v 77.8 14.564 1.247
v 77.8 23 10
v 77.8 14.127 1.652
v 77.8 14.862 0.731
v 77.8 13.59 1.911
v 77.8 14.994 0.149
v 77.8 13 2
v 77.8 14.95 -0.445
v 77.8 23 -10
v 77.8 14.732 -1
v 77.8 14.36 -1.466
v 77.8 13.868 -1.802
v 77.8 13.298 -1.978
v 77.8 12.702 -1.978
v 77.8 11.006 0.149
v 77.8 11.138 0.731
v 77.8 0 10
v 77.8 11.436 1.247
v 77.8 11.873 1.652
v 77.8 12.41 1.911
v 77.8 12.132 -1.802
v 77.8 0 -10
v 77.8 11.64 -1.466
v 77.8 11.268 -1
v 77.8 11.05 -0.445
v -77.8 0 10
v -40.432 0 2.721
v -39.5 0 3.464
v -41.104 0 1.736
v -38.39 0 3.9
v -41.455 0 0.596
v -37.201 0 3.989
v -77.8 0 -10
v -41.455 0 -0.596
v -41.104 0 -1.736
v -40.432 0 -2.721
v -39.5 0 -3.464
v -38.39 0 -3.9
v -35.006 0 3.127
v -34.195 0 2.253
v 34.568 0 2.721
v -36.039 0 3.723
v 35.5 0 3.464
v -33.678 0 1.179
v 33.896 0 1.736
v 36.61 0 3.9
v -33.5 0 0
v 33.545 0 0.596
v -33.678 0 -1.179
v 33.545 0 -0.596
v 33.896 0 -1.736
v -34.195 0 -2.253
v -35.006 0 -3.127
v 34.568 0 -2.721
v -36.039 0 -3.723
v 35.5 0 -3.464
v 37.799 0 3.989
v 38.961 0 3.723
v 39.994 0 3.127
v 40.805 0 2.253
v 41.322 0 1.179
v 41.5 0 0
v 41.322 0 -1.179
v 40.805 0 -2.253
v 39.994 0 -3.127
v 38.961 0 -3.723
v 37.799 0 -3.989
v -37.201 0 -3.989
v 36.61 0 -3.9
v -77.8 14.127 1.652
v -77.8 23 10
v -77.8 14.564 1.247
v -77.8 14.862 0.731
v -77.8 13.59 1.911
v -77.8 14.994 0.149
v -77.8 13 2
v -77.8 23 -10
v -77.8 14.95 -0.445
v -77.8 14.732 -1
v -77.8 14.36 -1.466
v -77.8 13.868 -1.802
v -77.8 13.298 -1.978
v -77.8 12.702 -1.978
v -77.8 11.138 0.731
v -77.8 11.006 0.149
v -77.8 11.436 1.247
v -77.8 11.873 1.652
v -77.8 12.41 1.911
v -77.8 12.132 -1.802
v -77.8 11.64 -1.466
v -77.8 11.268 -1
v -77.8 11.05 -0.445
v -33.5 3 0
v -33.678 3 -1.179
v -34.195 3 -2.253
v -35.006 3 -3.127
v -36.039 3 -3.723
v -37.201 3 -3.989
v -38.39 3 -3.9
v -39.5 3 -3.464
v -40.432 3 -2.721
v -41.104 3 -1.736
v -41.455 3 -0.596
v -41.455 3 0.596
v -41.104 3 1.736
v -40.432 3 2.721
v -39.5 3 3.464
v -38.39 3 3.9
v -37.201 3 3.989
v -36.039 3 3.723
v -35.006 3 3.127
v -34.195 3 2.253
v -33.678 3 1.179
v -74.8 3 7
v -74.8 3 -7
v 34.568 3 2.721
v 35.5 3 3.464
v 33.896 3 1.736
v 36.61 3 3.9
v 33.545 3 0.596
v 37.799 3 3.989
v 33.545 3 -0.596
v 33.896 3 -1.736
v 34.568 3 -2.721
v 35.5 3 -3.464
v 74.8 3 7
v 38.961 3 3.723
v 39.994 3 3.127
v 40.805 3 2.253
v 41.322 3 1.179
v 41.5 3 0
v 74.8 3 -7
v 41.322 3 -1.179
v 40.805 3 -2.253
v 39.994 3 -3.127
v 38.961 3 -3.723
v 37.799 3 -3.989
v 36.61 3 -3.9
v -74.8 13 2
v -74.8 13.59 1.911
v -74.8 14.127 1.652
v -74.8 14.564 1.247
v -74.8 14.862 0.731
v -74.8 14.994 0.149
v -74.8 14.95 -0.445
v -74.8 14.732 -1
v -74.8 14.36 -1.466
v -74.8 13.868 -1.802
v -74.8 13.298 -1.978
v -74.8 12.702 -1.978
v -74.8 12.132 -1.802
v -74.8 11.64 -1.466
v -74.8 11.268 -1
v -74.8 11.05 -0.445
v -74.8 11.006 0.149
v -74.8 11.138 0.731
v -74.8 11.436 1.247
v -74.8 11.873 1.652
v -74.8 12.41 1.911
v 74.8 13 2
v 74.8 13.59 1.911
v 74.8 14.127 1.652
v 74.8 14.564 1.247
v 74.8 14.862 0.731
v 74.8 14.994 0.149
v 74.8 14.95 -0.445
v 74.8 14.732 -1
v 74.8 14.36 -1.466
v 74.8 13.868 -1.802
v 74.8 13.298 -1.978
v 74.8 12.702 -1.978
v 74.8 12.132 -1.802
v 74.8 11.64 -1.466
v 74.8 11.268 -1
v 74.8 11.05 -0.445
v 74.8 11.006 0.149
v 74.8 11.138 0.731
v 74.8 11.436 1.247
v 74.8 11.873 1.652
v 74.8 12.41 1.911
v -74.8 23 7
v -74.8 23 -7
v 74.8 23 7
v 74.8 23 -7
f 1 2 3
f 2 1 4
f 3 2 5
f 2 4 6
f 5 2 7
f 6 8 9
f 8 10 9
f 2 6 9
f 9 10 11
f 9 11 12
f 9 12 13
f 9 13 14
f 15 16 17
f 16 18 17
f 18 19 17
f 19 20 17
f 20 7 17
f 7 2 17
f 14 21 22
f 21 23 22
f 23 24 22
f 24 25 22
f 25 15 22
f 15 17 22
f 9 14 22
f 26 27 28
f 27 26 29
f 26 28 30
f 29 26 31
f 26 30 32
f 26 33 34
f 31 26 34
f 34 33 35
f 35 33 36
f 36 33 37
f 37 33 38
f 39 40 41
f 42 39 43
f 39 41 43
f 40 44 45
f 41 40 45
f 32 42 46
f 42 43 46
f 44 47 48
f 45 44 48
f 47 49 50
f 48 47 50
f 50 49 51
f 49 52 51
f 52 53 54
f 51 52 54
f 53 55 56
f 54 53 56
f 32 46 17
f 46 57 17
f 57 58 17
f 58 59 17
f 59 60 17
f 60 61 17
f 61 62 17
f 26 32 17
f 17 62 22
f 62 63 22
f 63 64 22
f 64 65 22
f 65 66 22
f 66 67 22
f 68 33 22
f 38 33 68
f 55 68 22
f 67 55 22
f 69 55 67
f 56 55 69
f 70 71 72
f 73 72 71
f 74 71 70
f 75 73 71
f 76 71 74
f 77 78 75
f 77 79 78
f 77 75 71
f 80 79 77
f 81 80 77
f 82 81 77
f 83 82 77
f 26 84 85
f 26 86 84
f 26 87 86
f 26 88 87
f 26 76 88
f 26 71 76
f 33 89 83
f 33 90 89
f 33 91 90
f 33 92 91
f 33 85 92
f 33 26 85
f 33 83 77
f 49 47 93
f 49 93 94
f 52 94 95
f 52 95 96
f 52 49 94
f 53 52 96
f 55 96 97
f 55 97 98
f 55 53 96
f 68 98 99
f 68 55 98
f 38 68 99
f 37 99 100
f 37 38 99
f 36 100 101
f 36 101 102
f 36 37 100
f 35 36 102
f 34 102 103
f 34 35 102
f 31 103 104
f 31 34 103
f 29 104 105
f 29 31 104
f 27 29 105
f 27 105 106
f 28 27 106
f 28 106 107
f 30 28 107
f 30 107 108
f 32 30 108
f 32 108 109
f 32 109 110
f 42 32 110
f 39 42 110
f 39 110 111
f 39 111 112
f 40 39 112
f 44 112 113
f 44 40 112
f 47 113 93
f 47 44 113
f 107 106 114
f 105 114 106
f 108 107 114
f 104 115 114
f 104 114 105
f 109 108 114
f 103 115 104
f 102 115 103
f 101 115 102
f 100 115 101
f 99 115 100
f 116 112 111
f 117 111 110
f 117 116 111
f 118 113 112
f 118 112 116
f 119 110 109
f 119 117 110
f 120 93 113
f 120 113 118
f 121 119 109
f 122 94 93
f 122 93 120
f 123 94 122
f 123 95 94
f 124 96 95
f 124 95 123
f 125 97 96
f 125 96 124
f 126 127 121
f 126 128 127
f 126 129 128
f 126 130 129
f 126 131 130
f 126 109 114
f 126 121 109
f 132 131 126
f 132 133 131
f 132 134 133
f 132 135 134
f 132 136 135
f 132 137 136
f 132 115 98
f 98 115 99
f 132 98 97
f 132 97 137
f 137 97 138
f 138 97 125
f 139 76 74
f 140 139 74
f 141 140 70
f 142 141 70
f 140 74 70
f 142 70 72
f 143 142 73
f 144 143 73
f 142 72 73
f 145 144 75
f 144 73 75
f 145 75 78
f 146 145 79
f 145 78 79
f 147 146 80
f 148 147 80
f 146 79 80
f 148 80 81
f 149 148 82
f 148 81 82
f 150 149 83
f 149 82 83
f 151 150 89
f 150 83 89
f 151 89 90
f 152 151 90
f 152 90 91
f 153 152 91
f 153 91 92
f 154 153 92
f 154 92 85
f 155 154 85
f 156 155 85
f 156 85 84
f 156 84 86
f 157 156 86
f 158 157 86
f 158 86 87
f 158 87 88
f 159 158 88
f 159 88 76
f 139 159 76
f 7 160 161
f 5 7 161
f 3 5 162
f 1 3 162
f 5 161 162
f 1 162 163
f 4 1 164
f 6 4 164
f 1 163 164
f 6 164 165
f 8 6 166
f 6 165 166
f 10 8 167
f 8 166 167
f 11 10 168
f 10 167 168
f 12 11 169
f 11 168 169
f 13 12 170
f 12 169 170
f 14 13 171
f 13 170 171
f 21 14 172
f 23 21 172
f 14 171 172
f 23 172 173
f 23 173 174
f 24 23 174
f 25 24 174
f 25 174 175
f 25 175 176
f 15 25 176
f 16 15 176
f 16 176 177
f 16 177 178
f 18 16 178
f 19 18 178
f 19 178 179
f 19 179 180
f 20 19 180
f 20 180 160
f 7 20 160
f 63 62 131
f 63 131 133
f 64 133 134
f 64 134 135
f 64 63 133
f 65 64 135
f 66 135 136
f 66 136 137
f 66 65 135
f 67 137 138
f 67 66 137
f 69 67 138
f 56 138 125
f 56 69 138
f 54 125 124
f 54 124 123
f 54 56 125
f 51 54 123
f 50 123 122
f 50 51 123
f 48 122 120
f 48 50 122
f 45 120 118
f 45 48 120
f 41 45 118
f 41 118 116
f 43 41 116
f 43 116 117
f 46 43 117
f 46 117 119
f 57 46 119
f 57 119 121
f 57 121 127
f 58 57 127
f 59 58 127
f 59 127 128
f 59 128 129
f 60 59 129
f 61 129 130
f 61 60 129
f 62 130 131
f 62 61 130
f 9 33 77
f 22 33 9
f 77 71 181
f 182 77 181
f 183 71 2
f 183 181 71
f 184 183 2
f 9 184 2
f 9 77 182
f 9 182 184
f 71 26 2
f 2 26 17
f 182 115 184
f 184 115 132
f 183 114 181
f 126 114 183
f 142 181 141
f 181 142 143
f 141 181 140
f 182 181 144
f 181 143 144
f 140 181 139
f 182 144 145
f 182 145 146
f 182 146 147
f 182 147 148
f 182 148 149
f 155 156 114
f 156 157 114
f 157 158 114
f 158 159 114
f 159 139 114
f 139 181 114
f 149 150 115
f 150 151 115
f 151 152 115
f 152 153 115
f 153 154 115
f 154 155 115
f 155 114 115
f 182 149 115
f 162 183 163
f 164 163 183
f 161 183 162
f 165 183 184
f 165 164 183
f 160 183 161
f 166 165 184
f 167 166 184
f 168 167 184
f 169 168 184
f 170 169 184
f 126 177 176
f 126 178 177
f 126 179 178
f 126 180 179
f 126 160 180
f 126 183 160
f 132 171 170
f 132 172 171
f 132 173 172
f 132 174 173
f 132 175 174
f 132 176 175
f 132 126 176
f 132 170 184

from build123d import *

# Parameters (mm, degrees)
SKETCH_1_W          = 155.6
SKETCH_1_H          = 20
SKETCH_1_R          = 4
EXTRUDE_1_DEPTH     = 3
SKETCH_2_W          = 155.6
SKETCH_2_H          = 20
SKETCH_2_W_2        = 149.6
SKETCH_2_H_2        = 14
EXTRUDE_2_DEPTH     = 20
SKETCH_3_R          = 2
CUT_EXTRUDE_1_DEPTH = 160


with BuildPart() as part:
    # 草图1 → 凸台-拉伸1 (new body)
    with BuildSketch(Plane(origin=(0, 0, 0), x_dir=(1, 0, 0), z_dir=(0, 1, 0))):
        Rectangle(SKETCH_1_W, SKETCH_1_H)
        with Locations((-37.5, 0)):
            Circle(SKETCH_1_R, mode=Mode.SUBTRACT)
        with Locations((37.5, 0)):
            Circle(SKETCH_1_R, mode=Mode.SUBTRACT)
    extrude(amount=EXTRUDE_1_DEPTH)

    # 草图2 → 凸台-拉伸2 (add)
    with BuildSketch(Plane(origin=(0, 3, 0), x_dir=(1, 0, 0), z_dir=(0, 1, 0))):
        Rectangle(SKETCH_2_W, SKETCH_2_H)
        Rectangle(SKETCH_2_W_2, SKETCH_2_H_2, mode=Mode.SUBTRACT)
    extrude(amount=EXTRUDE_2_DEPTH)

    # 草图3 → 切除-拉伸1 (cut)
    with BuildSketch(Plane.ZY.offset(77.8)):
        with Locations((0, 13)):
            Circle(SKETCH_3_R)
    extrude(amount=-CUT_EXTRUDE_1_DEPTH, mode=Mode.SUBTRACT)


solid = part.part
